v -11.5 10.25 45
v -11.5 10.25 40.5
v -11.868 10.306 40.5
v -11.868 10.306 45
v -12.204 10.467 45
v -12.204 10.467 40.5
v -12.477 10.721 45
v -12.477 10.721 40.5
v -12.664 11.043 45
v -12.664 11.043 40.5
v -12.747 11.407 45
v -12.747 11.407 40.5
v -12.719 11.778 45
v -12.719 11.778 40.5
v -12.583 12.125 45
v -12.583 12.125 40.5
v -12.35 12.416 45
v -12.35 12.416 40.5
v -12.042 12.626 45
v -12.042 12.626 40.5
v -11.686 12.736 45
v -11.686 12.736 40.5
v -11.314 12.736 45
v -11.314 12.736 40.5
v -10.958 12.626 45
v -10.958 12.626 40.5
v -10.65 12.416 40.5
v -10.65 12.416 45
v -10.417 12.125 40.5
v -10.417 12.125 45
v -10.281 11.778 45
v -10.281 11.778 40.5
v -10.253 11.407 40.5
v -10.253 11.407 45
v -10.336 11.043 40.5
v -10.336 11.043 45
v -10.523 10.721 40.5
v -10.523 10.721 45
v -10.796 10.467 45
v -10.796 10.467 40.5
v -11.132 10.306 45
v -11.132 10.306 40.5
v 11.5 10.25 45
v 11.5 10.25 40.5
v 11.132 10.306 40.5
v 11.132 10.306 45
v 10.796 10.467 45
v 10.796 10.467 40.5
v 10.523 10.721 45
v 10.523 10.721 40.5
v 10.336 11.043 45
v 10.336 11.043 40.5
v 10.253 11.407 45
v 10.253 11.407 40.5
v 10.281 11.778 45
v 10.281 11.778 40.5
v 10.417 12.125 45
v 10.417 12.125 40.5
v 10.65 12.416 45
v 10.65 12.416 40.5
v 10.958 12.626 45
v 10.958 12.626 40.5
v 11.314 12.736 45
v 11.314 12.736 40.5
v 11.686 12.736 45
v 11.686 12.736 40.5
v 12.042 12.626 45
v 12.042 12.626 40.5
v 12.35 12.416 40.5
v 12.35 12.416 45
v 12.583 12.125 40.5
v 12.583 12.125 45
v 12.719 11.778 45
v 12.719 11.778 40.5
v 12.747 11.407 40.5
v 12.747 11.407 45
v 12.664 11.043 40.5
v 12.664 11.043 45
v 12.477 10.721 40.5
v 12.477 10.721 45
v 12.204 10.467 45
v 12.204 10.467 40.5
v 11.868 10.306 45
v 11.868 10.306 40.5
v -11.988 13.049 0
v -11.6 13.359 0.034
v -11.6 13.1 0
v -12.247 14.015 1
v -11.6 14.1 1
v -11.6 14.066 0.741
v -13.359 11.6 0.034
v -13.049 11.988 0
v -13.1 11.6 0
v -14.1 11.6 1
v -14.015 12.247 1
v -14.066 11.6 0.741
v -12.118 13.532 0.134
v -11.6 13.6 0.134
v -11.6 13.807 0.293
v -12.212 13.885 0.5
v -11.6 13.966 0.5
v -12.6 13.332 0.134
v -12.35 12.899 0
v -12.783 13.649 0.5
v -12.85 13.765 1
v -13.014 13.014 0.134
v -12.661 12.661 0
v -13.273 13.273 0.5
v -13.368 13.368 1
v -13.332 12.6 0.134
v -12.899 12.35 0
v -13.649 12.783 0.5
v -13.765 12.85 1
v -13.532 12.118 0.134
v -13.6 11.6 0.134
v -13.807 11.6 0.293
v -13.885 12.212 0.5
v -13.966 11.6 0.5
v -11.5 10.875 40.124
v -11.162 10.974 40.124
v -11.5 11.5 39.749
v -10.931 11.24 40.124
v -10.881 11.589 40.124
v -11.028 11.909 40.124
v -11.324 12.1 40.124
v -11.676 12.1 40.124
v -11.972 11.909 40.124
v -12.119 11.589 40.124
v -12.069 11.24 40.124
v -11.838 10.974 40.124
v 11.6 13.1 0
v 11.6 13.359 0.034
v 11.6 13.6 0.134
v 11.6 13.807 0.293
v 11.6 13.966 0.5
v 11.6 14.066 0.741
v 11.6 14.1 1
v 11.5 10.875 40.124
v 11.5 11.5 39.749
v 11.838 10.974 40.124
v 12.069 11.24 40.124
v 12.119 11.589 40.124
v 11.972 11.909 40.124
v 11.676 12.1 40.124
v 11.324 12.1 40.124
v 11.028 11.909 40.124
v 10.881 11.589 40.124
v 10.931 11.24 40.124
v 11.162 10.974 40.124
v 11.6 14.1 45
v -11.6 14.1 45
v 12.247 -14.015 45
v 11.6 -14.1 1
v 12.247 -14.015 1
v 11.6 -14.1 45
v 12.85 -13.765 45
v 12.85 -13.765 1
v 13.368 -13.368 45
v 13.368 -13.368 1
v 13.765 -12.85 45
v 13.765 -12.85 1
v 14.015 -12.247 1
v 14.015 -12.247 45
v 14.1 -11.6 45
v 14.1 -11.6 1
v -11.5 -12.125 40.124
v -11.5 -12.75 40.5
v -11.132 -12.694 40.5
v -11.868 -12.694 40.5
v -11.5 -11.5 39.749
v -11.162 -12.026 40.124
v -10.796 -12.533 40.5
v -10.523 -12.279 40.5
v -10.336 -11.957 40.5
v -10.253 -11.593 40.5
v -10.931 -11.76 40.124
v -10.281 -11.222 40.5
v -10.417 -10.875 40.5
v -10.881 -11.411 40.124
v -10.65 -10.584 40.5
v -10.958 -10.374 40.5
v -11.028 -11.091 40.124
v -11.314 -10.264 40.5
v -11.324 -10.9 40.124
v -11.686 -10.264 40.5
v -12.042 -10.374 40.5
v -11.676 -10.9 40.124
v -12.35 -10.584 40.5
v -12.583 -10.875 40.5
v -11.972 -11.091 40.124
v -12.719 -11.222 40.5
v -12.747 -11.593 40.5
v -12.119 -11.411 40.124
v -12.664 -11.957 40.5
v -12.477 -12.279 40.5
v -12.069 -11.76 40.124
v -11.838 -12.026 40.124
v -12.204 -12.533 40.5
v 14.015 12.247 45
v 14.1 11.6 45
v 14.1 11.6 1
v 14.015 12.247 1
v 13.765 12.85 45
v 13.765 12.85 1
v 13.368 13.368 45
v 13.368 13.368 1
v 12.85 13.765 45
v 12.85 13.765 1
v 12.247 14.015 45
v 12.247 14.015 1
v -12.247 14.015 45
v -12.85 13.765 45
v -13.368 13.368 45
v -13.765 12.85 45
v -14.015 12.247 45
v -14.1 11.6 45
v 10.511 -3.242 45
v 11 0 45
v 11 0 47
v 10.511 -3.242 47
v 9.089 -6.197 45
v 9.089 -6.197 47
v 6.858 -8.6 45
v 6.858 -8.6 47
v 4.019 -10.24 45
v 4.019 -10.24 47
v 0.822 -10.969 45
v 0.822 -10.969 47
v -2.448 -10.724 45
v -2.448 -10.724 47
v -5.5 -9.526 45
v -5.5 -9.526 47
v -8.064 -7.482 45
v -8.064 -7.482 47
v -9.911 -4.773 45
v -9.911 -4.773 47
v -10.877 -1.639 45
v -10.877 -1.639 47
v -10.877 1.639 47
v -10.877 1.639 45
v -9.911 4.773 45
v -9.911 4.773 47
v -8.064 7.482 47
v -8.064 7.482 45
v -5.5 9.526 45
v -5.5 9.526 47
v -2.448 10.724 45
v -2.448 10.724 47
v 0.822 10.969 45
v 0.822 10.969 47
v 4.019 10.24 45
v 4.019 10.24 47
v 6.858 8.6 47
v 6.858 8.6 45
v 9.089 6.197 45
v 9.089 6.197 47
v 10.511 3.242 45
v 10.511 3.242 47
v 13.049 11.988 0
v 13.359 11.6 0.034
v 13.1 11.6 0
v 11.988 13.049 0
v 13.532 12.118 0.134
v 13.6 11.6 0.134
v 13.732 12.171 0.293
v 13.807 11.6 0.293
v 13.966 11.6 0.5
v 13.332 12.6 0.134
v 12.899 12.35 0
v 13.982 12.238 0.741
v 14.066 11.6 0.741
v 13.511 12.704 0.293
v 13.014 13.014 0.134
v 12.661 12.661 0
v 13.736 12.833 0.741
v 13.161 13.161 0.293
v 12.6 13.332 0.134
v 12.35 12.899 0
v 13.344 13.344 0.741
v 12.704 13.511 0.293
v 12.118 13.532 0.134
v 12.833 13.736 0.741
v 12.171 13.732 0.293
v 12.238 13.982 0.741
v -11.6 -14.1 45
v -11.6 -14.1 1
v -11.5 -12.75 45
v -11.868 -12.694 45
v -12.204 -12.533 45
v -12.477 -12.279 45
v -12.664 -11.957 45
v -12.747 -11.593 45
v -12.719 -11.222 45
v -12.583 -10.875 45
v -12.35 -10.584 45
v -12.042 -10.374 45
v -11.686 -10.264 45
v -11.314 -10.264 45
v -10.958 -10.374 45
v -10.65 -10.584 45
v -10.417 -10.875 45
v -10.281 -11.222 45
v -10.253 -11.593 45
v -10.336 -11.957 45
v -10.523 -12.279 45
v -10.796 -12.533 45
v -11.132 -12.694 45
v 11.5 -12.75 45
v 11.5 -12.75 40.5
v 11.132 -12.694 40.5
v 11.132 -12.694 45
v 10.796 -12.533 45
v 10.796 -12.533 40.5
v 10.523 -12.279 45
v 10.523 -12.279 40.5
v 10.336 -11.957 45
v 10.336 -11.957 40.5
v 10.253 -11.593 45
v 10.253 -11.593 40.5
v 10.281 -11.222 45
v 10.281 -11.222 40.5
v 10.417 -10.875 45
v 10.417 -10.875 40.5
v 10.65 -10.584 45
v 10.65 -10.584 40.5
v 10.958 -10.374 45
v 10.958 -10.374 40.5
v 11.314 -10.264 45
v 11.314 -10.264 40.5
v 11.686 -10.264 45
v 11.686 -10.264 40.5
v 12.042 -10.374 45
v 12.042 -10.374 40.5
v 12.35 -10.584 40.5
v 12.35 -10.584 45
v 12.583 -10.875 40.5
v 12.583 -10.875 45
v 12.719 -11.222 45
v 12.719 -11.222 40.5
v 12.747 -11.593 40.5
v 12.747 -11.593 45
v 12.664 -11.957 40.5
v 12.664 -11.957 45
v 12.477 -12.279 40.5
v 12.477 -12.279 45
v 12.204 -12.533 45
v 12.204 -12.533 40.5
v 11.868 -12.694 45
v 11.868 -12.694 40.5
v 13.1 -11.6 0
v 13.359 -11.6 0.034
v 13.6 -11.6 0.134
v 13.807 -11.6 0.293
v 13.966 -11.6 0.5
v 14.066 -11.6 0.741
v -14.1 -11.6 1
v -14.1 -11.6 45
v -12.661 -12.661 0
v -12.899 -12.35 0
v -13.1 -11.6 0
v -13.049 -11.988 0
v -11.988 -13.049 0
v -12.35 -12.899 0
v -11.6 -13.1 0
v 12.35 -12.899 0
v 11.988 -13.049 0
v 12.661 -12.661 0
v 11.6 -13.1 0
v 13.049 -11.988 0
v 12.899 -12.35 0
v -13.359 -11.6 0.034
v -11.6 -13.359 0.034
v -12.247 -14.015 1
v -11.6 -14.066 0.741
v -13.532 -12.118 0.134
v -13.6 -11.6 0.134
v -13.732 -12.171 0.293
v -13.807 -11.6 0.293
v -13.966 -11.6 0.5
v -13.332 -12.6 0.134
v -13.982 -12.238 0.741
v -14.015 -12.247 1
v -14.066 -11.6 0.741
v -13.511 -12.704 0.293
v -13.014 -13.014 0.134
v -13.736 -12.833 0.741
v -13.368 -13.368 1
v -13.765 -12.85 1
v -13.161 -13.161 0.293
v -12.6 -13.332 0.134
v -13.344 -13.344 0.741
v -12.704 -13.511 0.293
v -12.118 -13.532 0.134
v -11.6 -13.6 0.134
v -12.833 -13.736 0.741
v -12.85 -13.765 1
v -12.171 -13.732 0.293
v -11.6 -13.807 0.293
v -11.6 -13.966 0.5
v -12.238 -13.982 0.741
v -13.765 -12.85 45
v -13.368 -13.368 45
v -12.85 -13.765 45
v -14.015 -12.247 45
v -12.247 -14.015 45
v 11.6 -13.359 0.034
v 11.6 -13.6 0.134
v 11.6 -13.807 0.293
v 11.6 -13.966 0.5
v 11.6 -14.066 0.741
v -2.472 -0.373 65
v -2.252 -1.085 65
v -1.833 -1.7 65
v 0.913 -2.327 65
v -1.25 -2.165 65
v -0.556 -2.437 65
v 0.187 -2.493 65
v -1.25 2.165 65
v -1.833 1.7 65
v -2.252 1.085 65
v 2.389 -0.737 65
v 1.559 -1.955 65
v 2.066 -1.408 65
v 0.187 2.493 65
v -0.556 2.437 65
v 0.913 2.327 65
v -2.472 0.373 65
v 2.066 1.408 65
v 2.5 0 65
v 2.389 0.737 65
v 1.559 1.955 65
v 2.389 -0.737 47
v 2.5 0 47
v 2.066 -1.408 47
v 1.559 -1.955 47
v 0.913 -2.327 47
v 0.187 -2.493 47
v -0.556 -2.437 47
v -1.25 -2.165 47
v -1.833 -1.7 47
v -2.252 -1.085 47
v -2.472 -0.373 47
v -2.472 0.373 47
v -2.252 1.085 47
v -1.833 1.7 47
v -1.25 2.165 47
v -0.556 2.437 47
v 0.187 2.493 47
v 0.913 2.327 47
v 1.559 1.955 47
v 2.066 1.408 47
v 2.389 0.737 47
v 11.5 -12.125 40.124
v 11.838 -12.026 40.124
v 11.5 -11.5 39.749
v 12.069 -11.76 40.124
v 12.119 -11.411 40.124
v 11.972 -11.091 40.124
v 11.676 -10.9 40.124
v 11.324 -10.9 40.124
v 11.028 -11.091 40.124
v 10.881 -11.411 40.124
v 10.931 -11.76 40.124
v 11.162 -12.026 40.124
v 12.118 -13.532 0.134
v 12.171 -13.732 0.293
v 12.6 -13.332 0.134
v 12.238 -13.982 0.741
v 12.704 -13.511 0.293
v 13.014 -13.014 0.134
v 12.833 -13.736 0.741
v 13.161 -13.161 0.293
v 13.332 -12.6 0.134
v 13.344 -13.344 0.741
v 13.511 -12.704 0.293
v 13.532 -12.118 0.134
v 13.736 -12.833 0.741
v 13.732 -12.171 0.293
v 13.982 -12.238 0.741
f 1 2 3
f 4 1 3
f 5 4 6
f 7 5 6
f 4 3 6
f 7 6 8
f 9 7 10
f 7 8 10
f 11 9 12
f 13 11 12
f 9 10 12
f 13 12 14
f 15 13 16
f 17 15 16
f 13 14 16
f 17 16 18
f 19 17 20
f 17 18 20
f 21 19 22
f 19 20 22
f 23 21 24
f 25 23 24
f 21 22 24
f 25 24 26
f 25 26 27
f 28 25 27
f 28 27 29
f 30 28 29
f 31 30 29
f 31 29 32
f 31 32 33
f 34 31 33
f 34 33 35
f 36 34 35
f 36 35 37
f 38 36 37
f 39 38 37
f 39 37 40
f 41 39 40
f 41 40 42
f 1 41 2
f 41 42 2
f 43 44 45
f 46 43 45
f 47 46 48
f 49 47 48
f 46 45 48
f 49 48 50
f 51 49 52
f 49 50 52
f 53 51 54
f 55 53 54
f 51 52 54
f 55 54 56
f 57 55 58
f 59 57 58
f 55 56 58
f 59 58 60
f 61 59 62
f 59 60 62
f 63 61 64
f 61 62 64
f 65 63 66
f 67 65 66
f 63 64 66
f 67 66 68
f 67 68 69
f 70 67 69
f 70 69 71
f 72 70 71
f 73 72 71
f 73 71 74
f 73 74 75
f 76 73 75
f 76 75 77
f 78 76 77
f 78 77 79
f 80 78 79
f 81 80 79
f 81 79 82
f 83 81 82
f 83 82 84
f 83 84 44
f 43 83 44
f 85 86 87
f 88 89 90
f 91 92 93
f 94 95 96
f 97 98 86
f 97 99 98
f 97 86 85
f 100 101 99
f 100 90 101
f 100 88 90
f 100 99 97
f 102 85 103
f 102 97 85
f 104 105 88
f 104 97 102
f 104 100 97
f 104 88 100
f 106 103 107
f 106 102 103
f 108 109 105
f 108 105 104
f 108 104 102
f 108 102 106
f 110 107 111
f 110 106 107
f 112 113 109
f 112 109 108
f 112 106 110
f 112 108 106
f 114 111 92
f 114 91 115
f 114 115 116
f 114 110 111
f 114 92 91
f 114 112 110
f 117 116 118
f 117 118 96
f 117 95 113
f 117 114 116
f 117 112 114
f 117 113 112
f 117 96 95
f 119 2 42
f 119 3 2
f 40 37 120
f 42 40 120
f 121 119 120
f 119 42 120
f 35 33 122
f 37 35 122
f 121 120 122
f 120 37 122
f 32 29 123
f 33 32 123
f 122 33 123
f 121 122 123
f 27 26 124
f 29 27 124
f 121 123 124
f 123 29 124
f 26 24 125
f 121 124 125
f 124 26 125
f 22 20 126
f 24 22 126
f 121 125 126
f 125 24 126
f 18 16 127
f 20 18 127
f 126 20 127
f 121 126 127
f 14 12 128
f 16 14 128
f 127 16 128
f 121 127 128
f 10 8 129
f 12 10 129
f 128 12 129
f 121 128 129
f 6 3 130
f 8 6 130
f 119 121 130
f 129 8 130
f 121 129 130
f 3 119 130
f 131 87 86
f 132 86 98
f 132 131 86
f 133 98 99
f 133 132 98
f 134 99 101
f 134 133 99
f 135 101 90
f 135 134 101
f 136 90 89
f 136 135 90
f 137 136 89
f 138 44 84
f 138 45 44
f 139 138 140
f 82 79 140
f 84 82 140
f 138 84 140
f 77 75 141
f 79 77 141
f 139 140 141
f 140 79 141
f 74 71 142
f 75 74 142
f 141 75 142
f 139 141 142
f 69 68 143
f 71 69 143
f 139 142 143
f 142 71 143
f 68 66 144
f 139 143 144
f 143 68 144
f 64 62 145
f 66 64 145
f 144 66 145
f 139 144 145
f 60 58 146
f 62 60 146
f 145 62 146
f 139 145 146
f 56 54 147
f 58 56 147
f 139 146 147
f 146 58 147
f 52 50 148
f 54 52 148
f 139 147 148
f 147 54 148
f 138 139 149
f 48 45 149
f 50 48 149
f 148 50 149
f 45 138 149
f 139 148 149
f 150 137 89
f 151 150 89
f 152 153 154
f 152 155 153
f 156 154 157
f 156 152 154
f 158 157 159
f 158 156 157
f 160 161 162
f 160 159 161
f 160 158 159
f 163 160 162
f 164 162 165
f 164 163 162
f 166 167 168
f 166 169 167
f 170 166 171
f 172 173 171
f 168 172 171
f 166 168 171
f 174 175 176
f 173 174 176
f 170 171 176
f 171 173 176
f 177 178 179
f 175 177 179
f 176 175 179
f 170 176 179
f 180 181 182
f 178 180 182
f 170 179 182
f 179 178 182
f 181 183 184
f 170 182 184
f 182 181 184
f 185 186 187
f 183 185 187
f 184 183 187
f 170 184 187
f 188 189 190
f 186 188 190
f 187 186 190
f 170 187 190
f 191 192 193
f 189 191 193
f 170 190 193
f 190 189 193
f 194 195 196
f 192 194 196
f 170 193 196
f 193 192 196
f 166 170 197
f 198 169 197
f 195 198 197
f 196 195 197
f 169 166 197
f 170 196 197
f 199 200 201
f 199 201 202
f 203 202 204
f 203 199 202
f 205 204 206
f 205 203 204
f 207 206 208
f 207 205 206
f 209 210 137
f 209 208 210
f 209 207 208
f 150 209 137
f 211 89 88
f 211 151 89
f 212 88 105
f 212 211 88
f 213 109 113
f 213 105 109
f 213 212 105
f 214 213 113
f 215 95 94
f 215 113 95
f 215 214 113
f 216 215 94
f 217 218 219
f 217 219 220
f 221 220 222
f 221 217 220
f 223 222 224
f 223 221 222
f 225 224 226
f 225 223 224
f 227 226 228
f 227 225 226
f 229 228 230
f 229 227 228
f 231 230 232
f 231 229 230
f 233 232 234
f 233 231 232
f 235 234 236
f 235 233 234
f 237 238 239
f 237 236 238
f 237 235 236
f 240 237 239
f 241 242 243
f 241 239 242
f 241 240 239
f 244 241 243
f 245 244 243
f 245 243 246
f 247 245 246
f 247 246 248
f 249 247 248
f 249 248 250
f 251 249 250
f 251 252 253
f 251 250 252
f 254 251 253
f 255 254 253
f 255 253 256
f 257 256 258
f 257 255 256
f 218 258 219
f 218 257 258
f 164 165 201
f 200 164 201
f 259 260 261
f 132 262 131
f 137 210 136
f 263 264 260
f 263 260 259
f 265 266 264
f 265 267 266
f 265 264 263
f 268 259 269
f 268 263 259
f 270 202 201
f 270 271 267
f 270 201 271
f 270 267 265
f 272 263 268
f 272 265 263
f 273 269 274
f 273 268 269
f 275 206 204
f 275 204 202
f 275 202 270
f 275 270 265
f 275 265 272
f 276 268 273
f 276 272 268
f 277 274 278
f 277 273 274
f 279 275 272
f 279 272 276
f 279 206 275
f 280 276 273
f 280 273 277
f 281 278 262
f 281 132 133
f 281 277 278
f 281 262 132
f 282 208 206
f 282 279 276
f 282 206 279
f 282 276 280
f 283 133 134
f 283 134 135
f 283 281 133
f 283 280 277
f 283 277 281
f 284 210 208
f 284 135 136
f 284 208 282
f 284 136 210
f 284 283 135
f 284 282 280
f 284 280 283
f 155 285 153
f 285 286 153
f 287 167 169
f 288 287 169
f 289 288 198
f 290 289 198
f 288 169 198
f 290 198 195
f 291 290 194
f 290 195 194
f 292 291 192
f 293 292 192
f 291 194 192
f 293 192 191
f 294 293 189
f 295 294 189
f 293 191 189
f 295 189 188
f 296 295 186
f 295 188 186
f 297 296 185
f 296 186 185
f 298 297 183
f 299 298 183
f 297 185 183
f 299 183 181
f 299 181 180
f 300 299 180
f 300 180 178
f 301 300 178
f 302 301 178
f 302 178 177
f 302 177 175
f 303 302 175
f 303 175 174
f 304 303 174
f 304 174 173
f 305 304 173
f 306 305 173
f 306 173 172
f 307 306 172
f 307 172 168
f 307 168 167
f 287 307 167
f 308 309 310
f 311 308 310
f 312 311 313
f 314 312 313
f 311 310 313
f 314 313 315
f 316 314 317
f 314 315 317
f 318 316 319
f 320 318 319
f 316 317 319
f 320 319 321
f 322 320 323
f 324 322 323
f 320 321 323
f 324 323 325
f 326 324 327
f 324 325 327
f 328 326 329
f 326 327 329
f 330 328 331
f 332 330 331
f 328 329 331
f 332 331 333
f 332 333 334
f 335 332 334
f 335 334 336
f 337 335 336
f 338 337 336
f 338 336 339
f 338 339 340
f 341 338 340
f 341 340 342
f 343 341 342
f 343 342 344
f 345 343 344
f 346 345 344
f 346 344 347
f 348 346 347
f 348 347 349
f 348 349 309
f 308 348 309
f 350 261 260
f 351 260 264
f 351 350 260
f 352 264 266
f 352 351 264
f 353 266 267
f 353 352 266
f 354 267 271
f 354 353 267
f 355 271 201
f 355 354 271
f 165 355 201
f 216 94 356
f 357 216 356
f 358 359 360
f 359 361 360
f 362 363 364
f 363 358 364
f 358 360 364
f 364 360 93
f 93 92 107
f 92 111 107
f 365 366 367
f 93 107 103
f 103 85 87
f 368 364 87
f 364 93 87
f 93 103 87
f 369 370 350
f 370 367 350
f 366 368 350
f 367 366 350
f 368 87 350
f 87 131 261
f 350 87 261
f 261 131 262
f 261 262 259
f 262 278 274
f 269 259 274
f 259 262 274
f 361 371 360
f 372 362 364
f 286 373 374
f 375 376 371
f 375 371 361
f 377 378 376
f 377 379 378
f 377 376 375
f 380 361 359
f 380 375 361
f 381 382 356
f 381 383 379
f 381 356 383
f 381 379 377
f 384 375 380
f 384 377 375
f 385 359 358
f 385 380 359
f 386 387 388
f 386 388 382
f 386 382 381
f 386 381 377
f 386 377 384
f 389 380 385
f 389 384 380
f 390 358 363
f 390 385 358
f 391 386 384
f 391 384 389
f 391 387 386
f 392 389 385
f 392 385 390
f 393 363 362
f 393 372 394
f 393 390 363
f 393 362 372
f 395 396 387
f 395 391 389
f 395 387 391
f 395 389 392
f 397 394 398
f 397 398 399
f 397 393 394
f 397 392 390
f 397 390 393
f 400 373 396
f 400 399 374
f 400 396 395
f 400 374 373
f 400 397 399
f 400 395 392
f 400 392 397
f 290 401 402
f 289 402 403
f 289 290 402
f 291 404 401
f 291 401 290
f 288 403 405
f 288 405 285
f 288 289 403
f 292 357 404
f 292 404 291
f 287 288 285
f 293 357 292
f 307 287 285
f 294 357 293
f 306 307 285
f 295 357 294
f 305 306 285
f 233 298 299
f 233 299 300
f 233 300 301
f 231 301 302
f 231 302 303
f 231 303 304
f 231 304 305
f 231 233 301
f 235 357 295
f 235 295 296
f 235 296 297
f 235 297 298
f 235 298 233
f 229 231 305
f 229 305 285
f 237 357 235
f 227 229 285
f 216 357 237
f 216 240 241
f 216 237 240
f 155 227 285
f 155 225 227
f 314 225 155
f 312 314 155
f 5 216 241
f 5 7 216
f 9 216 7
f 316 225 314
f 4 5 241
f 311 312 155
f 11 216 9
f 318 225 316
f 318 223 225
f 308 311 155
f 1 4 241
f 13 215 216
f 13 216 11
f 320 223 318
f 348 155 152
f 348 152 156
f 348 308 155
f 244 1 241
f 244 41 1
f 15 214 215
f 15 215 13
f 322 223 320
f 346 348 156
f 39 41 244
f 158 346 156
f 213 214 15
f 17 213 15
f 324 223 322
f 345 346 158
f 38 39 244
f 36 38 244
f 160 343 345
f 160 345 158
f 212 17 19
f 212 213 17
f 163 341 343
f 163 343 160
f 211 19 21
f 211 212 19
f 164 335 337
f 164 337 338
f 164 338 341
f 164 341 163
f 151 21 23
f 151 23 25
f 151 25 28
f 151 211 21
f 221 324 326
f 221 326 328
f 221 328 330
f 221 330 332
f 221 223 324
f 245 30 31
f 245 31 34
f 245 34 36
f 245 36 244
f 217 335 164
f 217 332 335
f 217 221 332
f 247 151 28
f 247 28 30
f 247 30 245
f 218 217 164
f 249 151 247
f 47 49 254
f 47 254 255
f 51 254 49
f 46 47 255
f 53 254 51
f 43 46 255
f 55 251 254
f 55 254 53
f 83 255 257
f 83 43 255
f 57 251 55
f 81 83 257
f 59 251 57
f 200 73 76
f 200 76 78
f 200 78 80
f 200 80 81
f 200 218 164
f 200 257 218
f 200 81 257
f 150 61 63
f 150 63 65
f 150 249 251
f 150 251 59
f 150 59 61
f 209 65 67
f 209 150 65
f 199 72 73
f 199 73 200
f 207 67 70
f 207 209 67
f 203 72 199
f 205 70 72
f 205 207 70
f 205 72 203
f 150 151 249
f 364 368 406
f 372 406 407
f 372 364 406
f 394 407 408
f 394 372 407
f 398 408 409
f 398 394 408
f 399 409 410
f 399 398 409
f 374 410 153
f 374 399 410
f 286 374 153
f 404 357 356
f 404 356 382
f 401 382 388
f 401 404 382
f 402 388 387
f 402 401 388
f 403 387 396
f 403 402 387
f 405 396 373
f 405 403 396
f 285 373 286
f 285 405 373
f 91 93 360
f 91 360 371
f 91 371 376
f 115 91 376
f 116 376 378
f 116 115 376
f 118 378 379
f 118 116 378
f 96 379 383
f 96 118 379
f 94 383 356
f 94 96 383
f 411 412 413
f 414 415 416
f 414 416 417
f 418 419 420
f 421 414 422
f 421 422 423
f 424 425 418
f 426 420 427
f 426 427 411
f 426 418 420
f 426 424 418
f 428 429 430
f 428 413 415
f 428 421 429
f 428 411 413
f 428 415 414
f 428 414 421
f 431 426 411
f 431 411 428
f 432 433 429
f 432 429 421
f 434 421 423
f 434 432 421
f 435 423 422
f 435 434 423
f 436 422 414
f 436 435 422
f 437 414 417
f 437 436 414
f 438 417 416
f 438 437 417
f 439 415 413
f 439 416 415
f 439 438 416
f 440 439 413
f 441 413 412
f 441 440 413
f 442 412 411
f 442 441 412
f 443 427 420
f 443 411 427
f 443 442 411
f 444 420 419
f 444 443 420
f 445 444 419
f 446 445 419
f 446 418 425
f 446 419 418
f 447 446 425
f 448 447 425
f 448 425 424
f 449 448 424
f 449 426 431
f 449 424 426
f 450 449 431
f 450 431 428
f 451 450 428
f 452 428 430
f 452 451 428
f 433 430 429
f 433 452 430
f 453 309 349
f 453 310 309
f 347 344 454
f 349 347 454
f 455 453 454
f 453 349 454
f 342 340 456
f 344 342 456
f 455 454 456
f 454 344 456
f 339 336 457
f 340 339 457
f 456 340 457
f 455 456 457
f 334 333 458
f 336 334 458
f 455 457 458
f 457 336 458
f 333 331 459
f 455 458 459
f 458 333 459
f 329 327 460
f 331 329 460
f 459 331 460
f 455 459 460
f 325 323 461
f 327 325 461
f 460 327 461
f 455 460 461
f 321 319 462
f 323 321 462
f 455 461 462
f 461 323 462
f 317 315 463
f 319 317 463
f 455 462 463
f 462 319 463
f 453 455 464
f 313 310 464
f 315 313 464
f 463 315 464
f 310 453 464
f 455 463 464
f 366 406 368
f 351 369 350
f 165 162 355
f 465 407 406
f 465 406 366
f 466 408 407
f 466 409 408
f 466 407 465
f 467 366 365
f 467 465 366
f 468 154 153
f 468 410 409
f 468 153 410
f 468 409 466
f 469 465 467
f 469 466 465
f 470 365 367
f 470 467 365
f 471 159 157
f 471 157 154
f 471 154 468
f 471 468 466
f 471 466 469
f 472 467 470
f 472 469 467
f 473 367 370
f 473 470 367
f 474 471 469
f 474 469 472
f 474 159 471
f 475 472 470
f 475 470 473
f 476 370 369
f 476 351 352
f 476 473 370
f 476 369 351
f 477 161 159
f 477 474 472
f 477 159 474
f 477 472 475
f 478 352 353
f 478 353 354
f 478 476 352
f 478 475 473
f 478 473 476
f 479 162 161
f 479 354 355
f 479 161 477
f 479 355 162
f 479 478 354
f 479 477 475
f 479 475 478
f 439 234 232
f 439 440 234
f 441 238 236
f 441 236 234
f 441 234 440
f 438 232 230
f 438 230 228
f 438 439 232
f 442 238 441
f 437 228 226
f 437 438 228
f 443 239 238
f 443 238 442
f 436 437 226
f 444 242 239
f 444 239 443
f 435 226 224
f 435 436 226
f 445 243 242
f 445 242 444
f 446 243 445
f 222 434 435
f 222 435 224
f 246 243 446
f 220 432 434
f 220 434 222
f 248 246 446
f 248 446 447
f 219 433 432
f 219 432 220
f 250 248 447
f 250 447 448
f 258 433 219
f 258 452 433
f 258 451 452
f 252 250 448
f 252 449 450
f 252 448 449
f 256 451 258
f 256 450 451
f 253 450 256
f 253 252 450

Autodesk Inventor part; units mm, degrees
ref_plane "YZ Plane" through (0, 0, 0) normal (1, 0, 0) x (0, 1, 0)
ref_plane "XZ Plane" through (0, 0, 0) normal (0, 1, 0) x (-1, 0, 0)
ref_plane "XY Plane" through (0, 0, 0) normal (0, 0, 1) x (1, 0, 0)
sketch "Sketch1" plane through (0, 0, 0) normal (0, 0, 1) x (1, 0, 0)
  line L0 (-14.1, -14.1) -> (14.1, -14.1)
  line L1 (14.1, -14.1) -> (14.1, 14.1)
  line L2 (14.1, 14.1) -> (-14.1, 14.1)
  line L3 (-14.1, 14.1) -> (-14.1, -14.1)
  line L4 (-14.1, -14.1) -> (14.1, 14.1) construction
  line L5 (14.1, -14.1) -> (-14.1, 14.1) construction
  point P0 (0, 0)
  dimension "d0" = 28.2
  dimension "d1" = 28.2
extrude "Extrusion1" add sketch "Sketch1" along normal blind 45
sketch "Sketch2" plane through (0, 0, 45) normal (0, 0, 1) x (1, 0, 0)
  circle A0 centre (0, 0) radius 11
  dimension "d4" = 22
extrude "Extrusion2" add sketch "Sketch2" along normal blind 2
sketch "Sketch3" plane through (0, 0, 47) normal (0, 0, 1) x (1, 0, 0)
  circle A0 centre (0, 0) radius 11 projected
  circle A1 centre (0, 0) radius 2.5
  dimension "d7" = 5
extrude "Extrusion3" add sketch "Sketch3" along normal blind 18 contours A1
sketch "Sketch4" plane through (0, 0, 45) normal (0, 0, 1) x (1, 0, 0)
  circle A0 centre (0, 0) radius 11 projected
  point P0 (-11.5, 11.5)
  point P1 (11.5, 11.5)
  point P2 (11.5, -11.5)
  point P3 (-11.5, -11.5)
  dimension "d10" = 11.5
  dimension "d11" = 11.5
  dimension "d12" = 11.5
  dimension "d13" = 11.5
  dimension "d14" = 11.5
  dimension "d15" = 11.5
  dimension "d16" = 11.5
  dimension "d17" = 11.5
hole "Hole1" at (-11.5, 11.5, 45) at (11.5, 11.5, 45) at (11.5, -11.5, 45) at (-11.5, -11.5, 45) direction (0, 0, -1) diameter 2.5 depth 4.5 tip angle 118
fillet "Fillet1" radius 2.5 4 edges at (-14.1, 14.1, 22.5) (14.1, 14.1, 22.5) (14.1, -14.1, 22.5) (-14.1, -14.1, 22.5)
fillet "Fillet2" radius 1 8 edges at (-13.3678, 13.3678, 0) (-14.1, 0, 0) (-13.3678, -13.3678, 0) (0, -14.1, 0) (13.3678, -13.3678, 0) (14.1, 0, 0) (13.3678, 13.3678, 0) (0, 14.1, 0)
properties part number "NEMA11"
